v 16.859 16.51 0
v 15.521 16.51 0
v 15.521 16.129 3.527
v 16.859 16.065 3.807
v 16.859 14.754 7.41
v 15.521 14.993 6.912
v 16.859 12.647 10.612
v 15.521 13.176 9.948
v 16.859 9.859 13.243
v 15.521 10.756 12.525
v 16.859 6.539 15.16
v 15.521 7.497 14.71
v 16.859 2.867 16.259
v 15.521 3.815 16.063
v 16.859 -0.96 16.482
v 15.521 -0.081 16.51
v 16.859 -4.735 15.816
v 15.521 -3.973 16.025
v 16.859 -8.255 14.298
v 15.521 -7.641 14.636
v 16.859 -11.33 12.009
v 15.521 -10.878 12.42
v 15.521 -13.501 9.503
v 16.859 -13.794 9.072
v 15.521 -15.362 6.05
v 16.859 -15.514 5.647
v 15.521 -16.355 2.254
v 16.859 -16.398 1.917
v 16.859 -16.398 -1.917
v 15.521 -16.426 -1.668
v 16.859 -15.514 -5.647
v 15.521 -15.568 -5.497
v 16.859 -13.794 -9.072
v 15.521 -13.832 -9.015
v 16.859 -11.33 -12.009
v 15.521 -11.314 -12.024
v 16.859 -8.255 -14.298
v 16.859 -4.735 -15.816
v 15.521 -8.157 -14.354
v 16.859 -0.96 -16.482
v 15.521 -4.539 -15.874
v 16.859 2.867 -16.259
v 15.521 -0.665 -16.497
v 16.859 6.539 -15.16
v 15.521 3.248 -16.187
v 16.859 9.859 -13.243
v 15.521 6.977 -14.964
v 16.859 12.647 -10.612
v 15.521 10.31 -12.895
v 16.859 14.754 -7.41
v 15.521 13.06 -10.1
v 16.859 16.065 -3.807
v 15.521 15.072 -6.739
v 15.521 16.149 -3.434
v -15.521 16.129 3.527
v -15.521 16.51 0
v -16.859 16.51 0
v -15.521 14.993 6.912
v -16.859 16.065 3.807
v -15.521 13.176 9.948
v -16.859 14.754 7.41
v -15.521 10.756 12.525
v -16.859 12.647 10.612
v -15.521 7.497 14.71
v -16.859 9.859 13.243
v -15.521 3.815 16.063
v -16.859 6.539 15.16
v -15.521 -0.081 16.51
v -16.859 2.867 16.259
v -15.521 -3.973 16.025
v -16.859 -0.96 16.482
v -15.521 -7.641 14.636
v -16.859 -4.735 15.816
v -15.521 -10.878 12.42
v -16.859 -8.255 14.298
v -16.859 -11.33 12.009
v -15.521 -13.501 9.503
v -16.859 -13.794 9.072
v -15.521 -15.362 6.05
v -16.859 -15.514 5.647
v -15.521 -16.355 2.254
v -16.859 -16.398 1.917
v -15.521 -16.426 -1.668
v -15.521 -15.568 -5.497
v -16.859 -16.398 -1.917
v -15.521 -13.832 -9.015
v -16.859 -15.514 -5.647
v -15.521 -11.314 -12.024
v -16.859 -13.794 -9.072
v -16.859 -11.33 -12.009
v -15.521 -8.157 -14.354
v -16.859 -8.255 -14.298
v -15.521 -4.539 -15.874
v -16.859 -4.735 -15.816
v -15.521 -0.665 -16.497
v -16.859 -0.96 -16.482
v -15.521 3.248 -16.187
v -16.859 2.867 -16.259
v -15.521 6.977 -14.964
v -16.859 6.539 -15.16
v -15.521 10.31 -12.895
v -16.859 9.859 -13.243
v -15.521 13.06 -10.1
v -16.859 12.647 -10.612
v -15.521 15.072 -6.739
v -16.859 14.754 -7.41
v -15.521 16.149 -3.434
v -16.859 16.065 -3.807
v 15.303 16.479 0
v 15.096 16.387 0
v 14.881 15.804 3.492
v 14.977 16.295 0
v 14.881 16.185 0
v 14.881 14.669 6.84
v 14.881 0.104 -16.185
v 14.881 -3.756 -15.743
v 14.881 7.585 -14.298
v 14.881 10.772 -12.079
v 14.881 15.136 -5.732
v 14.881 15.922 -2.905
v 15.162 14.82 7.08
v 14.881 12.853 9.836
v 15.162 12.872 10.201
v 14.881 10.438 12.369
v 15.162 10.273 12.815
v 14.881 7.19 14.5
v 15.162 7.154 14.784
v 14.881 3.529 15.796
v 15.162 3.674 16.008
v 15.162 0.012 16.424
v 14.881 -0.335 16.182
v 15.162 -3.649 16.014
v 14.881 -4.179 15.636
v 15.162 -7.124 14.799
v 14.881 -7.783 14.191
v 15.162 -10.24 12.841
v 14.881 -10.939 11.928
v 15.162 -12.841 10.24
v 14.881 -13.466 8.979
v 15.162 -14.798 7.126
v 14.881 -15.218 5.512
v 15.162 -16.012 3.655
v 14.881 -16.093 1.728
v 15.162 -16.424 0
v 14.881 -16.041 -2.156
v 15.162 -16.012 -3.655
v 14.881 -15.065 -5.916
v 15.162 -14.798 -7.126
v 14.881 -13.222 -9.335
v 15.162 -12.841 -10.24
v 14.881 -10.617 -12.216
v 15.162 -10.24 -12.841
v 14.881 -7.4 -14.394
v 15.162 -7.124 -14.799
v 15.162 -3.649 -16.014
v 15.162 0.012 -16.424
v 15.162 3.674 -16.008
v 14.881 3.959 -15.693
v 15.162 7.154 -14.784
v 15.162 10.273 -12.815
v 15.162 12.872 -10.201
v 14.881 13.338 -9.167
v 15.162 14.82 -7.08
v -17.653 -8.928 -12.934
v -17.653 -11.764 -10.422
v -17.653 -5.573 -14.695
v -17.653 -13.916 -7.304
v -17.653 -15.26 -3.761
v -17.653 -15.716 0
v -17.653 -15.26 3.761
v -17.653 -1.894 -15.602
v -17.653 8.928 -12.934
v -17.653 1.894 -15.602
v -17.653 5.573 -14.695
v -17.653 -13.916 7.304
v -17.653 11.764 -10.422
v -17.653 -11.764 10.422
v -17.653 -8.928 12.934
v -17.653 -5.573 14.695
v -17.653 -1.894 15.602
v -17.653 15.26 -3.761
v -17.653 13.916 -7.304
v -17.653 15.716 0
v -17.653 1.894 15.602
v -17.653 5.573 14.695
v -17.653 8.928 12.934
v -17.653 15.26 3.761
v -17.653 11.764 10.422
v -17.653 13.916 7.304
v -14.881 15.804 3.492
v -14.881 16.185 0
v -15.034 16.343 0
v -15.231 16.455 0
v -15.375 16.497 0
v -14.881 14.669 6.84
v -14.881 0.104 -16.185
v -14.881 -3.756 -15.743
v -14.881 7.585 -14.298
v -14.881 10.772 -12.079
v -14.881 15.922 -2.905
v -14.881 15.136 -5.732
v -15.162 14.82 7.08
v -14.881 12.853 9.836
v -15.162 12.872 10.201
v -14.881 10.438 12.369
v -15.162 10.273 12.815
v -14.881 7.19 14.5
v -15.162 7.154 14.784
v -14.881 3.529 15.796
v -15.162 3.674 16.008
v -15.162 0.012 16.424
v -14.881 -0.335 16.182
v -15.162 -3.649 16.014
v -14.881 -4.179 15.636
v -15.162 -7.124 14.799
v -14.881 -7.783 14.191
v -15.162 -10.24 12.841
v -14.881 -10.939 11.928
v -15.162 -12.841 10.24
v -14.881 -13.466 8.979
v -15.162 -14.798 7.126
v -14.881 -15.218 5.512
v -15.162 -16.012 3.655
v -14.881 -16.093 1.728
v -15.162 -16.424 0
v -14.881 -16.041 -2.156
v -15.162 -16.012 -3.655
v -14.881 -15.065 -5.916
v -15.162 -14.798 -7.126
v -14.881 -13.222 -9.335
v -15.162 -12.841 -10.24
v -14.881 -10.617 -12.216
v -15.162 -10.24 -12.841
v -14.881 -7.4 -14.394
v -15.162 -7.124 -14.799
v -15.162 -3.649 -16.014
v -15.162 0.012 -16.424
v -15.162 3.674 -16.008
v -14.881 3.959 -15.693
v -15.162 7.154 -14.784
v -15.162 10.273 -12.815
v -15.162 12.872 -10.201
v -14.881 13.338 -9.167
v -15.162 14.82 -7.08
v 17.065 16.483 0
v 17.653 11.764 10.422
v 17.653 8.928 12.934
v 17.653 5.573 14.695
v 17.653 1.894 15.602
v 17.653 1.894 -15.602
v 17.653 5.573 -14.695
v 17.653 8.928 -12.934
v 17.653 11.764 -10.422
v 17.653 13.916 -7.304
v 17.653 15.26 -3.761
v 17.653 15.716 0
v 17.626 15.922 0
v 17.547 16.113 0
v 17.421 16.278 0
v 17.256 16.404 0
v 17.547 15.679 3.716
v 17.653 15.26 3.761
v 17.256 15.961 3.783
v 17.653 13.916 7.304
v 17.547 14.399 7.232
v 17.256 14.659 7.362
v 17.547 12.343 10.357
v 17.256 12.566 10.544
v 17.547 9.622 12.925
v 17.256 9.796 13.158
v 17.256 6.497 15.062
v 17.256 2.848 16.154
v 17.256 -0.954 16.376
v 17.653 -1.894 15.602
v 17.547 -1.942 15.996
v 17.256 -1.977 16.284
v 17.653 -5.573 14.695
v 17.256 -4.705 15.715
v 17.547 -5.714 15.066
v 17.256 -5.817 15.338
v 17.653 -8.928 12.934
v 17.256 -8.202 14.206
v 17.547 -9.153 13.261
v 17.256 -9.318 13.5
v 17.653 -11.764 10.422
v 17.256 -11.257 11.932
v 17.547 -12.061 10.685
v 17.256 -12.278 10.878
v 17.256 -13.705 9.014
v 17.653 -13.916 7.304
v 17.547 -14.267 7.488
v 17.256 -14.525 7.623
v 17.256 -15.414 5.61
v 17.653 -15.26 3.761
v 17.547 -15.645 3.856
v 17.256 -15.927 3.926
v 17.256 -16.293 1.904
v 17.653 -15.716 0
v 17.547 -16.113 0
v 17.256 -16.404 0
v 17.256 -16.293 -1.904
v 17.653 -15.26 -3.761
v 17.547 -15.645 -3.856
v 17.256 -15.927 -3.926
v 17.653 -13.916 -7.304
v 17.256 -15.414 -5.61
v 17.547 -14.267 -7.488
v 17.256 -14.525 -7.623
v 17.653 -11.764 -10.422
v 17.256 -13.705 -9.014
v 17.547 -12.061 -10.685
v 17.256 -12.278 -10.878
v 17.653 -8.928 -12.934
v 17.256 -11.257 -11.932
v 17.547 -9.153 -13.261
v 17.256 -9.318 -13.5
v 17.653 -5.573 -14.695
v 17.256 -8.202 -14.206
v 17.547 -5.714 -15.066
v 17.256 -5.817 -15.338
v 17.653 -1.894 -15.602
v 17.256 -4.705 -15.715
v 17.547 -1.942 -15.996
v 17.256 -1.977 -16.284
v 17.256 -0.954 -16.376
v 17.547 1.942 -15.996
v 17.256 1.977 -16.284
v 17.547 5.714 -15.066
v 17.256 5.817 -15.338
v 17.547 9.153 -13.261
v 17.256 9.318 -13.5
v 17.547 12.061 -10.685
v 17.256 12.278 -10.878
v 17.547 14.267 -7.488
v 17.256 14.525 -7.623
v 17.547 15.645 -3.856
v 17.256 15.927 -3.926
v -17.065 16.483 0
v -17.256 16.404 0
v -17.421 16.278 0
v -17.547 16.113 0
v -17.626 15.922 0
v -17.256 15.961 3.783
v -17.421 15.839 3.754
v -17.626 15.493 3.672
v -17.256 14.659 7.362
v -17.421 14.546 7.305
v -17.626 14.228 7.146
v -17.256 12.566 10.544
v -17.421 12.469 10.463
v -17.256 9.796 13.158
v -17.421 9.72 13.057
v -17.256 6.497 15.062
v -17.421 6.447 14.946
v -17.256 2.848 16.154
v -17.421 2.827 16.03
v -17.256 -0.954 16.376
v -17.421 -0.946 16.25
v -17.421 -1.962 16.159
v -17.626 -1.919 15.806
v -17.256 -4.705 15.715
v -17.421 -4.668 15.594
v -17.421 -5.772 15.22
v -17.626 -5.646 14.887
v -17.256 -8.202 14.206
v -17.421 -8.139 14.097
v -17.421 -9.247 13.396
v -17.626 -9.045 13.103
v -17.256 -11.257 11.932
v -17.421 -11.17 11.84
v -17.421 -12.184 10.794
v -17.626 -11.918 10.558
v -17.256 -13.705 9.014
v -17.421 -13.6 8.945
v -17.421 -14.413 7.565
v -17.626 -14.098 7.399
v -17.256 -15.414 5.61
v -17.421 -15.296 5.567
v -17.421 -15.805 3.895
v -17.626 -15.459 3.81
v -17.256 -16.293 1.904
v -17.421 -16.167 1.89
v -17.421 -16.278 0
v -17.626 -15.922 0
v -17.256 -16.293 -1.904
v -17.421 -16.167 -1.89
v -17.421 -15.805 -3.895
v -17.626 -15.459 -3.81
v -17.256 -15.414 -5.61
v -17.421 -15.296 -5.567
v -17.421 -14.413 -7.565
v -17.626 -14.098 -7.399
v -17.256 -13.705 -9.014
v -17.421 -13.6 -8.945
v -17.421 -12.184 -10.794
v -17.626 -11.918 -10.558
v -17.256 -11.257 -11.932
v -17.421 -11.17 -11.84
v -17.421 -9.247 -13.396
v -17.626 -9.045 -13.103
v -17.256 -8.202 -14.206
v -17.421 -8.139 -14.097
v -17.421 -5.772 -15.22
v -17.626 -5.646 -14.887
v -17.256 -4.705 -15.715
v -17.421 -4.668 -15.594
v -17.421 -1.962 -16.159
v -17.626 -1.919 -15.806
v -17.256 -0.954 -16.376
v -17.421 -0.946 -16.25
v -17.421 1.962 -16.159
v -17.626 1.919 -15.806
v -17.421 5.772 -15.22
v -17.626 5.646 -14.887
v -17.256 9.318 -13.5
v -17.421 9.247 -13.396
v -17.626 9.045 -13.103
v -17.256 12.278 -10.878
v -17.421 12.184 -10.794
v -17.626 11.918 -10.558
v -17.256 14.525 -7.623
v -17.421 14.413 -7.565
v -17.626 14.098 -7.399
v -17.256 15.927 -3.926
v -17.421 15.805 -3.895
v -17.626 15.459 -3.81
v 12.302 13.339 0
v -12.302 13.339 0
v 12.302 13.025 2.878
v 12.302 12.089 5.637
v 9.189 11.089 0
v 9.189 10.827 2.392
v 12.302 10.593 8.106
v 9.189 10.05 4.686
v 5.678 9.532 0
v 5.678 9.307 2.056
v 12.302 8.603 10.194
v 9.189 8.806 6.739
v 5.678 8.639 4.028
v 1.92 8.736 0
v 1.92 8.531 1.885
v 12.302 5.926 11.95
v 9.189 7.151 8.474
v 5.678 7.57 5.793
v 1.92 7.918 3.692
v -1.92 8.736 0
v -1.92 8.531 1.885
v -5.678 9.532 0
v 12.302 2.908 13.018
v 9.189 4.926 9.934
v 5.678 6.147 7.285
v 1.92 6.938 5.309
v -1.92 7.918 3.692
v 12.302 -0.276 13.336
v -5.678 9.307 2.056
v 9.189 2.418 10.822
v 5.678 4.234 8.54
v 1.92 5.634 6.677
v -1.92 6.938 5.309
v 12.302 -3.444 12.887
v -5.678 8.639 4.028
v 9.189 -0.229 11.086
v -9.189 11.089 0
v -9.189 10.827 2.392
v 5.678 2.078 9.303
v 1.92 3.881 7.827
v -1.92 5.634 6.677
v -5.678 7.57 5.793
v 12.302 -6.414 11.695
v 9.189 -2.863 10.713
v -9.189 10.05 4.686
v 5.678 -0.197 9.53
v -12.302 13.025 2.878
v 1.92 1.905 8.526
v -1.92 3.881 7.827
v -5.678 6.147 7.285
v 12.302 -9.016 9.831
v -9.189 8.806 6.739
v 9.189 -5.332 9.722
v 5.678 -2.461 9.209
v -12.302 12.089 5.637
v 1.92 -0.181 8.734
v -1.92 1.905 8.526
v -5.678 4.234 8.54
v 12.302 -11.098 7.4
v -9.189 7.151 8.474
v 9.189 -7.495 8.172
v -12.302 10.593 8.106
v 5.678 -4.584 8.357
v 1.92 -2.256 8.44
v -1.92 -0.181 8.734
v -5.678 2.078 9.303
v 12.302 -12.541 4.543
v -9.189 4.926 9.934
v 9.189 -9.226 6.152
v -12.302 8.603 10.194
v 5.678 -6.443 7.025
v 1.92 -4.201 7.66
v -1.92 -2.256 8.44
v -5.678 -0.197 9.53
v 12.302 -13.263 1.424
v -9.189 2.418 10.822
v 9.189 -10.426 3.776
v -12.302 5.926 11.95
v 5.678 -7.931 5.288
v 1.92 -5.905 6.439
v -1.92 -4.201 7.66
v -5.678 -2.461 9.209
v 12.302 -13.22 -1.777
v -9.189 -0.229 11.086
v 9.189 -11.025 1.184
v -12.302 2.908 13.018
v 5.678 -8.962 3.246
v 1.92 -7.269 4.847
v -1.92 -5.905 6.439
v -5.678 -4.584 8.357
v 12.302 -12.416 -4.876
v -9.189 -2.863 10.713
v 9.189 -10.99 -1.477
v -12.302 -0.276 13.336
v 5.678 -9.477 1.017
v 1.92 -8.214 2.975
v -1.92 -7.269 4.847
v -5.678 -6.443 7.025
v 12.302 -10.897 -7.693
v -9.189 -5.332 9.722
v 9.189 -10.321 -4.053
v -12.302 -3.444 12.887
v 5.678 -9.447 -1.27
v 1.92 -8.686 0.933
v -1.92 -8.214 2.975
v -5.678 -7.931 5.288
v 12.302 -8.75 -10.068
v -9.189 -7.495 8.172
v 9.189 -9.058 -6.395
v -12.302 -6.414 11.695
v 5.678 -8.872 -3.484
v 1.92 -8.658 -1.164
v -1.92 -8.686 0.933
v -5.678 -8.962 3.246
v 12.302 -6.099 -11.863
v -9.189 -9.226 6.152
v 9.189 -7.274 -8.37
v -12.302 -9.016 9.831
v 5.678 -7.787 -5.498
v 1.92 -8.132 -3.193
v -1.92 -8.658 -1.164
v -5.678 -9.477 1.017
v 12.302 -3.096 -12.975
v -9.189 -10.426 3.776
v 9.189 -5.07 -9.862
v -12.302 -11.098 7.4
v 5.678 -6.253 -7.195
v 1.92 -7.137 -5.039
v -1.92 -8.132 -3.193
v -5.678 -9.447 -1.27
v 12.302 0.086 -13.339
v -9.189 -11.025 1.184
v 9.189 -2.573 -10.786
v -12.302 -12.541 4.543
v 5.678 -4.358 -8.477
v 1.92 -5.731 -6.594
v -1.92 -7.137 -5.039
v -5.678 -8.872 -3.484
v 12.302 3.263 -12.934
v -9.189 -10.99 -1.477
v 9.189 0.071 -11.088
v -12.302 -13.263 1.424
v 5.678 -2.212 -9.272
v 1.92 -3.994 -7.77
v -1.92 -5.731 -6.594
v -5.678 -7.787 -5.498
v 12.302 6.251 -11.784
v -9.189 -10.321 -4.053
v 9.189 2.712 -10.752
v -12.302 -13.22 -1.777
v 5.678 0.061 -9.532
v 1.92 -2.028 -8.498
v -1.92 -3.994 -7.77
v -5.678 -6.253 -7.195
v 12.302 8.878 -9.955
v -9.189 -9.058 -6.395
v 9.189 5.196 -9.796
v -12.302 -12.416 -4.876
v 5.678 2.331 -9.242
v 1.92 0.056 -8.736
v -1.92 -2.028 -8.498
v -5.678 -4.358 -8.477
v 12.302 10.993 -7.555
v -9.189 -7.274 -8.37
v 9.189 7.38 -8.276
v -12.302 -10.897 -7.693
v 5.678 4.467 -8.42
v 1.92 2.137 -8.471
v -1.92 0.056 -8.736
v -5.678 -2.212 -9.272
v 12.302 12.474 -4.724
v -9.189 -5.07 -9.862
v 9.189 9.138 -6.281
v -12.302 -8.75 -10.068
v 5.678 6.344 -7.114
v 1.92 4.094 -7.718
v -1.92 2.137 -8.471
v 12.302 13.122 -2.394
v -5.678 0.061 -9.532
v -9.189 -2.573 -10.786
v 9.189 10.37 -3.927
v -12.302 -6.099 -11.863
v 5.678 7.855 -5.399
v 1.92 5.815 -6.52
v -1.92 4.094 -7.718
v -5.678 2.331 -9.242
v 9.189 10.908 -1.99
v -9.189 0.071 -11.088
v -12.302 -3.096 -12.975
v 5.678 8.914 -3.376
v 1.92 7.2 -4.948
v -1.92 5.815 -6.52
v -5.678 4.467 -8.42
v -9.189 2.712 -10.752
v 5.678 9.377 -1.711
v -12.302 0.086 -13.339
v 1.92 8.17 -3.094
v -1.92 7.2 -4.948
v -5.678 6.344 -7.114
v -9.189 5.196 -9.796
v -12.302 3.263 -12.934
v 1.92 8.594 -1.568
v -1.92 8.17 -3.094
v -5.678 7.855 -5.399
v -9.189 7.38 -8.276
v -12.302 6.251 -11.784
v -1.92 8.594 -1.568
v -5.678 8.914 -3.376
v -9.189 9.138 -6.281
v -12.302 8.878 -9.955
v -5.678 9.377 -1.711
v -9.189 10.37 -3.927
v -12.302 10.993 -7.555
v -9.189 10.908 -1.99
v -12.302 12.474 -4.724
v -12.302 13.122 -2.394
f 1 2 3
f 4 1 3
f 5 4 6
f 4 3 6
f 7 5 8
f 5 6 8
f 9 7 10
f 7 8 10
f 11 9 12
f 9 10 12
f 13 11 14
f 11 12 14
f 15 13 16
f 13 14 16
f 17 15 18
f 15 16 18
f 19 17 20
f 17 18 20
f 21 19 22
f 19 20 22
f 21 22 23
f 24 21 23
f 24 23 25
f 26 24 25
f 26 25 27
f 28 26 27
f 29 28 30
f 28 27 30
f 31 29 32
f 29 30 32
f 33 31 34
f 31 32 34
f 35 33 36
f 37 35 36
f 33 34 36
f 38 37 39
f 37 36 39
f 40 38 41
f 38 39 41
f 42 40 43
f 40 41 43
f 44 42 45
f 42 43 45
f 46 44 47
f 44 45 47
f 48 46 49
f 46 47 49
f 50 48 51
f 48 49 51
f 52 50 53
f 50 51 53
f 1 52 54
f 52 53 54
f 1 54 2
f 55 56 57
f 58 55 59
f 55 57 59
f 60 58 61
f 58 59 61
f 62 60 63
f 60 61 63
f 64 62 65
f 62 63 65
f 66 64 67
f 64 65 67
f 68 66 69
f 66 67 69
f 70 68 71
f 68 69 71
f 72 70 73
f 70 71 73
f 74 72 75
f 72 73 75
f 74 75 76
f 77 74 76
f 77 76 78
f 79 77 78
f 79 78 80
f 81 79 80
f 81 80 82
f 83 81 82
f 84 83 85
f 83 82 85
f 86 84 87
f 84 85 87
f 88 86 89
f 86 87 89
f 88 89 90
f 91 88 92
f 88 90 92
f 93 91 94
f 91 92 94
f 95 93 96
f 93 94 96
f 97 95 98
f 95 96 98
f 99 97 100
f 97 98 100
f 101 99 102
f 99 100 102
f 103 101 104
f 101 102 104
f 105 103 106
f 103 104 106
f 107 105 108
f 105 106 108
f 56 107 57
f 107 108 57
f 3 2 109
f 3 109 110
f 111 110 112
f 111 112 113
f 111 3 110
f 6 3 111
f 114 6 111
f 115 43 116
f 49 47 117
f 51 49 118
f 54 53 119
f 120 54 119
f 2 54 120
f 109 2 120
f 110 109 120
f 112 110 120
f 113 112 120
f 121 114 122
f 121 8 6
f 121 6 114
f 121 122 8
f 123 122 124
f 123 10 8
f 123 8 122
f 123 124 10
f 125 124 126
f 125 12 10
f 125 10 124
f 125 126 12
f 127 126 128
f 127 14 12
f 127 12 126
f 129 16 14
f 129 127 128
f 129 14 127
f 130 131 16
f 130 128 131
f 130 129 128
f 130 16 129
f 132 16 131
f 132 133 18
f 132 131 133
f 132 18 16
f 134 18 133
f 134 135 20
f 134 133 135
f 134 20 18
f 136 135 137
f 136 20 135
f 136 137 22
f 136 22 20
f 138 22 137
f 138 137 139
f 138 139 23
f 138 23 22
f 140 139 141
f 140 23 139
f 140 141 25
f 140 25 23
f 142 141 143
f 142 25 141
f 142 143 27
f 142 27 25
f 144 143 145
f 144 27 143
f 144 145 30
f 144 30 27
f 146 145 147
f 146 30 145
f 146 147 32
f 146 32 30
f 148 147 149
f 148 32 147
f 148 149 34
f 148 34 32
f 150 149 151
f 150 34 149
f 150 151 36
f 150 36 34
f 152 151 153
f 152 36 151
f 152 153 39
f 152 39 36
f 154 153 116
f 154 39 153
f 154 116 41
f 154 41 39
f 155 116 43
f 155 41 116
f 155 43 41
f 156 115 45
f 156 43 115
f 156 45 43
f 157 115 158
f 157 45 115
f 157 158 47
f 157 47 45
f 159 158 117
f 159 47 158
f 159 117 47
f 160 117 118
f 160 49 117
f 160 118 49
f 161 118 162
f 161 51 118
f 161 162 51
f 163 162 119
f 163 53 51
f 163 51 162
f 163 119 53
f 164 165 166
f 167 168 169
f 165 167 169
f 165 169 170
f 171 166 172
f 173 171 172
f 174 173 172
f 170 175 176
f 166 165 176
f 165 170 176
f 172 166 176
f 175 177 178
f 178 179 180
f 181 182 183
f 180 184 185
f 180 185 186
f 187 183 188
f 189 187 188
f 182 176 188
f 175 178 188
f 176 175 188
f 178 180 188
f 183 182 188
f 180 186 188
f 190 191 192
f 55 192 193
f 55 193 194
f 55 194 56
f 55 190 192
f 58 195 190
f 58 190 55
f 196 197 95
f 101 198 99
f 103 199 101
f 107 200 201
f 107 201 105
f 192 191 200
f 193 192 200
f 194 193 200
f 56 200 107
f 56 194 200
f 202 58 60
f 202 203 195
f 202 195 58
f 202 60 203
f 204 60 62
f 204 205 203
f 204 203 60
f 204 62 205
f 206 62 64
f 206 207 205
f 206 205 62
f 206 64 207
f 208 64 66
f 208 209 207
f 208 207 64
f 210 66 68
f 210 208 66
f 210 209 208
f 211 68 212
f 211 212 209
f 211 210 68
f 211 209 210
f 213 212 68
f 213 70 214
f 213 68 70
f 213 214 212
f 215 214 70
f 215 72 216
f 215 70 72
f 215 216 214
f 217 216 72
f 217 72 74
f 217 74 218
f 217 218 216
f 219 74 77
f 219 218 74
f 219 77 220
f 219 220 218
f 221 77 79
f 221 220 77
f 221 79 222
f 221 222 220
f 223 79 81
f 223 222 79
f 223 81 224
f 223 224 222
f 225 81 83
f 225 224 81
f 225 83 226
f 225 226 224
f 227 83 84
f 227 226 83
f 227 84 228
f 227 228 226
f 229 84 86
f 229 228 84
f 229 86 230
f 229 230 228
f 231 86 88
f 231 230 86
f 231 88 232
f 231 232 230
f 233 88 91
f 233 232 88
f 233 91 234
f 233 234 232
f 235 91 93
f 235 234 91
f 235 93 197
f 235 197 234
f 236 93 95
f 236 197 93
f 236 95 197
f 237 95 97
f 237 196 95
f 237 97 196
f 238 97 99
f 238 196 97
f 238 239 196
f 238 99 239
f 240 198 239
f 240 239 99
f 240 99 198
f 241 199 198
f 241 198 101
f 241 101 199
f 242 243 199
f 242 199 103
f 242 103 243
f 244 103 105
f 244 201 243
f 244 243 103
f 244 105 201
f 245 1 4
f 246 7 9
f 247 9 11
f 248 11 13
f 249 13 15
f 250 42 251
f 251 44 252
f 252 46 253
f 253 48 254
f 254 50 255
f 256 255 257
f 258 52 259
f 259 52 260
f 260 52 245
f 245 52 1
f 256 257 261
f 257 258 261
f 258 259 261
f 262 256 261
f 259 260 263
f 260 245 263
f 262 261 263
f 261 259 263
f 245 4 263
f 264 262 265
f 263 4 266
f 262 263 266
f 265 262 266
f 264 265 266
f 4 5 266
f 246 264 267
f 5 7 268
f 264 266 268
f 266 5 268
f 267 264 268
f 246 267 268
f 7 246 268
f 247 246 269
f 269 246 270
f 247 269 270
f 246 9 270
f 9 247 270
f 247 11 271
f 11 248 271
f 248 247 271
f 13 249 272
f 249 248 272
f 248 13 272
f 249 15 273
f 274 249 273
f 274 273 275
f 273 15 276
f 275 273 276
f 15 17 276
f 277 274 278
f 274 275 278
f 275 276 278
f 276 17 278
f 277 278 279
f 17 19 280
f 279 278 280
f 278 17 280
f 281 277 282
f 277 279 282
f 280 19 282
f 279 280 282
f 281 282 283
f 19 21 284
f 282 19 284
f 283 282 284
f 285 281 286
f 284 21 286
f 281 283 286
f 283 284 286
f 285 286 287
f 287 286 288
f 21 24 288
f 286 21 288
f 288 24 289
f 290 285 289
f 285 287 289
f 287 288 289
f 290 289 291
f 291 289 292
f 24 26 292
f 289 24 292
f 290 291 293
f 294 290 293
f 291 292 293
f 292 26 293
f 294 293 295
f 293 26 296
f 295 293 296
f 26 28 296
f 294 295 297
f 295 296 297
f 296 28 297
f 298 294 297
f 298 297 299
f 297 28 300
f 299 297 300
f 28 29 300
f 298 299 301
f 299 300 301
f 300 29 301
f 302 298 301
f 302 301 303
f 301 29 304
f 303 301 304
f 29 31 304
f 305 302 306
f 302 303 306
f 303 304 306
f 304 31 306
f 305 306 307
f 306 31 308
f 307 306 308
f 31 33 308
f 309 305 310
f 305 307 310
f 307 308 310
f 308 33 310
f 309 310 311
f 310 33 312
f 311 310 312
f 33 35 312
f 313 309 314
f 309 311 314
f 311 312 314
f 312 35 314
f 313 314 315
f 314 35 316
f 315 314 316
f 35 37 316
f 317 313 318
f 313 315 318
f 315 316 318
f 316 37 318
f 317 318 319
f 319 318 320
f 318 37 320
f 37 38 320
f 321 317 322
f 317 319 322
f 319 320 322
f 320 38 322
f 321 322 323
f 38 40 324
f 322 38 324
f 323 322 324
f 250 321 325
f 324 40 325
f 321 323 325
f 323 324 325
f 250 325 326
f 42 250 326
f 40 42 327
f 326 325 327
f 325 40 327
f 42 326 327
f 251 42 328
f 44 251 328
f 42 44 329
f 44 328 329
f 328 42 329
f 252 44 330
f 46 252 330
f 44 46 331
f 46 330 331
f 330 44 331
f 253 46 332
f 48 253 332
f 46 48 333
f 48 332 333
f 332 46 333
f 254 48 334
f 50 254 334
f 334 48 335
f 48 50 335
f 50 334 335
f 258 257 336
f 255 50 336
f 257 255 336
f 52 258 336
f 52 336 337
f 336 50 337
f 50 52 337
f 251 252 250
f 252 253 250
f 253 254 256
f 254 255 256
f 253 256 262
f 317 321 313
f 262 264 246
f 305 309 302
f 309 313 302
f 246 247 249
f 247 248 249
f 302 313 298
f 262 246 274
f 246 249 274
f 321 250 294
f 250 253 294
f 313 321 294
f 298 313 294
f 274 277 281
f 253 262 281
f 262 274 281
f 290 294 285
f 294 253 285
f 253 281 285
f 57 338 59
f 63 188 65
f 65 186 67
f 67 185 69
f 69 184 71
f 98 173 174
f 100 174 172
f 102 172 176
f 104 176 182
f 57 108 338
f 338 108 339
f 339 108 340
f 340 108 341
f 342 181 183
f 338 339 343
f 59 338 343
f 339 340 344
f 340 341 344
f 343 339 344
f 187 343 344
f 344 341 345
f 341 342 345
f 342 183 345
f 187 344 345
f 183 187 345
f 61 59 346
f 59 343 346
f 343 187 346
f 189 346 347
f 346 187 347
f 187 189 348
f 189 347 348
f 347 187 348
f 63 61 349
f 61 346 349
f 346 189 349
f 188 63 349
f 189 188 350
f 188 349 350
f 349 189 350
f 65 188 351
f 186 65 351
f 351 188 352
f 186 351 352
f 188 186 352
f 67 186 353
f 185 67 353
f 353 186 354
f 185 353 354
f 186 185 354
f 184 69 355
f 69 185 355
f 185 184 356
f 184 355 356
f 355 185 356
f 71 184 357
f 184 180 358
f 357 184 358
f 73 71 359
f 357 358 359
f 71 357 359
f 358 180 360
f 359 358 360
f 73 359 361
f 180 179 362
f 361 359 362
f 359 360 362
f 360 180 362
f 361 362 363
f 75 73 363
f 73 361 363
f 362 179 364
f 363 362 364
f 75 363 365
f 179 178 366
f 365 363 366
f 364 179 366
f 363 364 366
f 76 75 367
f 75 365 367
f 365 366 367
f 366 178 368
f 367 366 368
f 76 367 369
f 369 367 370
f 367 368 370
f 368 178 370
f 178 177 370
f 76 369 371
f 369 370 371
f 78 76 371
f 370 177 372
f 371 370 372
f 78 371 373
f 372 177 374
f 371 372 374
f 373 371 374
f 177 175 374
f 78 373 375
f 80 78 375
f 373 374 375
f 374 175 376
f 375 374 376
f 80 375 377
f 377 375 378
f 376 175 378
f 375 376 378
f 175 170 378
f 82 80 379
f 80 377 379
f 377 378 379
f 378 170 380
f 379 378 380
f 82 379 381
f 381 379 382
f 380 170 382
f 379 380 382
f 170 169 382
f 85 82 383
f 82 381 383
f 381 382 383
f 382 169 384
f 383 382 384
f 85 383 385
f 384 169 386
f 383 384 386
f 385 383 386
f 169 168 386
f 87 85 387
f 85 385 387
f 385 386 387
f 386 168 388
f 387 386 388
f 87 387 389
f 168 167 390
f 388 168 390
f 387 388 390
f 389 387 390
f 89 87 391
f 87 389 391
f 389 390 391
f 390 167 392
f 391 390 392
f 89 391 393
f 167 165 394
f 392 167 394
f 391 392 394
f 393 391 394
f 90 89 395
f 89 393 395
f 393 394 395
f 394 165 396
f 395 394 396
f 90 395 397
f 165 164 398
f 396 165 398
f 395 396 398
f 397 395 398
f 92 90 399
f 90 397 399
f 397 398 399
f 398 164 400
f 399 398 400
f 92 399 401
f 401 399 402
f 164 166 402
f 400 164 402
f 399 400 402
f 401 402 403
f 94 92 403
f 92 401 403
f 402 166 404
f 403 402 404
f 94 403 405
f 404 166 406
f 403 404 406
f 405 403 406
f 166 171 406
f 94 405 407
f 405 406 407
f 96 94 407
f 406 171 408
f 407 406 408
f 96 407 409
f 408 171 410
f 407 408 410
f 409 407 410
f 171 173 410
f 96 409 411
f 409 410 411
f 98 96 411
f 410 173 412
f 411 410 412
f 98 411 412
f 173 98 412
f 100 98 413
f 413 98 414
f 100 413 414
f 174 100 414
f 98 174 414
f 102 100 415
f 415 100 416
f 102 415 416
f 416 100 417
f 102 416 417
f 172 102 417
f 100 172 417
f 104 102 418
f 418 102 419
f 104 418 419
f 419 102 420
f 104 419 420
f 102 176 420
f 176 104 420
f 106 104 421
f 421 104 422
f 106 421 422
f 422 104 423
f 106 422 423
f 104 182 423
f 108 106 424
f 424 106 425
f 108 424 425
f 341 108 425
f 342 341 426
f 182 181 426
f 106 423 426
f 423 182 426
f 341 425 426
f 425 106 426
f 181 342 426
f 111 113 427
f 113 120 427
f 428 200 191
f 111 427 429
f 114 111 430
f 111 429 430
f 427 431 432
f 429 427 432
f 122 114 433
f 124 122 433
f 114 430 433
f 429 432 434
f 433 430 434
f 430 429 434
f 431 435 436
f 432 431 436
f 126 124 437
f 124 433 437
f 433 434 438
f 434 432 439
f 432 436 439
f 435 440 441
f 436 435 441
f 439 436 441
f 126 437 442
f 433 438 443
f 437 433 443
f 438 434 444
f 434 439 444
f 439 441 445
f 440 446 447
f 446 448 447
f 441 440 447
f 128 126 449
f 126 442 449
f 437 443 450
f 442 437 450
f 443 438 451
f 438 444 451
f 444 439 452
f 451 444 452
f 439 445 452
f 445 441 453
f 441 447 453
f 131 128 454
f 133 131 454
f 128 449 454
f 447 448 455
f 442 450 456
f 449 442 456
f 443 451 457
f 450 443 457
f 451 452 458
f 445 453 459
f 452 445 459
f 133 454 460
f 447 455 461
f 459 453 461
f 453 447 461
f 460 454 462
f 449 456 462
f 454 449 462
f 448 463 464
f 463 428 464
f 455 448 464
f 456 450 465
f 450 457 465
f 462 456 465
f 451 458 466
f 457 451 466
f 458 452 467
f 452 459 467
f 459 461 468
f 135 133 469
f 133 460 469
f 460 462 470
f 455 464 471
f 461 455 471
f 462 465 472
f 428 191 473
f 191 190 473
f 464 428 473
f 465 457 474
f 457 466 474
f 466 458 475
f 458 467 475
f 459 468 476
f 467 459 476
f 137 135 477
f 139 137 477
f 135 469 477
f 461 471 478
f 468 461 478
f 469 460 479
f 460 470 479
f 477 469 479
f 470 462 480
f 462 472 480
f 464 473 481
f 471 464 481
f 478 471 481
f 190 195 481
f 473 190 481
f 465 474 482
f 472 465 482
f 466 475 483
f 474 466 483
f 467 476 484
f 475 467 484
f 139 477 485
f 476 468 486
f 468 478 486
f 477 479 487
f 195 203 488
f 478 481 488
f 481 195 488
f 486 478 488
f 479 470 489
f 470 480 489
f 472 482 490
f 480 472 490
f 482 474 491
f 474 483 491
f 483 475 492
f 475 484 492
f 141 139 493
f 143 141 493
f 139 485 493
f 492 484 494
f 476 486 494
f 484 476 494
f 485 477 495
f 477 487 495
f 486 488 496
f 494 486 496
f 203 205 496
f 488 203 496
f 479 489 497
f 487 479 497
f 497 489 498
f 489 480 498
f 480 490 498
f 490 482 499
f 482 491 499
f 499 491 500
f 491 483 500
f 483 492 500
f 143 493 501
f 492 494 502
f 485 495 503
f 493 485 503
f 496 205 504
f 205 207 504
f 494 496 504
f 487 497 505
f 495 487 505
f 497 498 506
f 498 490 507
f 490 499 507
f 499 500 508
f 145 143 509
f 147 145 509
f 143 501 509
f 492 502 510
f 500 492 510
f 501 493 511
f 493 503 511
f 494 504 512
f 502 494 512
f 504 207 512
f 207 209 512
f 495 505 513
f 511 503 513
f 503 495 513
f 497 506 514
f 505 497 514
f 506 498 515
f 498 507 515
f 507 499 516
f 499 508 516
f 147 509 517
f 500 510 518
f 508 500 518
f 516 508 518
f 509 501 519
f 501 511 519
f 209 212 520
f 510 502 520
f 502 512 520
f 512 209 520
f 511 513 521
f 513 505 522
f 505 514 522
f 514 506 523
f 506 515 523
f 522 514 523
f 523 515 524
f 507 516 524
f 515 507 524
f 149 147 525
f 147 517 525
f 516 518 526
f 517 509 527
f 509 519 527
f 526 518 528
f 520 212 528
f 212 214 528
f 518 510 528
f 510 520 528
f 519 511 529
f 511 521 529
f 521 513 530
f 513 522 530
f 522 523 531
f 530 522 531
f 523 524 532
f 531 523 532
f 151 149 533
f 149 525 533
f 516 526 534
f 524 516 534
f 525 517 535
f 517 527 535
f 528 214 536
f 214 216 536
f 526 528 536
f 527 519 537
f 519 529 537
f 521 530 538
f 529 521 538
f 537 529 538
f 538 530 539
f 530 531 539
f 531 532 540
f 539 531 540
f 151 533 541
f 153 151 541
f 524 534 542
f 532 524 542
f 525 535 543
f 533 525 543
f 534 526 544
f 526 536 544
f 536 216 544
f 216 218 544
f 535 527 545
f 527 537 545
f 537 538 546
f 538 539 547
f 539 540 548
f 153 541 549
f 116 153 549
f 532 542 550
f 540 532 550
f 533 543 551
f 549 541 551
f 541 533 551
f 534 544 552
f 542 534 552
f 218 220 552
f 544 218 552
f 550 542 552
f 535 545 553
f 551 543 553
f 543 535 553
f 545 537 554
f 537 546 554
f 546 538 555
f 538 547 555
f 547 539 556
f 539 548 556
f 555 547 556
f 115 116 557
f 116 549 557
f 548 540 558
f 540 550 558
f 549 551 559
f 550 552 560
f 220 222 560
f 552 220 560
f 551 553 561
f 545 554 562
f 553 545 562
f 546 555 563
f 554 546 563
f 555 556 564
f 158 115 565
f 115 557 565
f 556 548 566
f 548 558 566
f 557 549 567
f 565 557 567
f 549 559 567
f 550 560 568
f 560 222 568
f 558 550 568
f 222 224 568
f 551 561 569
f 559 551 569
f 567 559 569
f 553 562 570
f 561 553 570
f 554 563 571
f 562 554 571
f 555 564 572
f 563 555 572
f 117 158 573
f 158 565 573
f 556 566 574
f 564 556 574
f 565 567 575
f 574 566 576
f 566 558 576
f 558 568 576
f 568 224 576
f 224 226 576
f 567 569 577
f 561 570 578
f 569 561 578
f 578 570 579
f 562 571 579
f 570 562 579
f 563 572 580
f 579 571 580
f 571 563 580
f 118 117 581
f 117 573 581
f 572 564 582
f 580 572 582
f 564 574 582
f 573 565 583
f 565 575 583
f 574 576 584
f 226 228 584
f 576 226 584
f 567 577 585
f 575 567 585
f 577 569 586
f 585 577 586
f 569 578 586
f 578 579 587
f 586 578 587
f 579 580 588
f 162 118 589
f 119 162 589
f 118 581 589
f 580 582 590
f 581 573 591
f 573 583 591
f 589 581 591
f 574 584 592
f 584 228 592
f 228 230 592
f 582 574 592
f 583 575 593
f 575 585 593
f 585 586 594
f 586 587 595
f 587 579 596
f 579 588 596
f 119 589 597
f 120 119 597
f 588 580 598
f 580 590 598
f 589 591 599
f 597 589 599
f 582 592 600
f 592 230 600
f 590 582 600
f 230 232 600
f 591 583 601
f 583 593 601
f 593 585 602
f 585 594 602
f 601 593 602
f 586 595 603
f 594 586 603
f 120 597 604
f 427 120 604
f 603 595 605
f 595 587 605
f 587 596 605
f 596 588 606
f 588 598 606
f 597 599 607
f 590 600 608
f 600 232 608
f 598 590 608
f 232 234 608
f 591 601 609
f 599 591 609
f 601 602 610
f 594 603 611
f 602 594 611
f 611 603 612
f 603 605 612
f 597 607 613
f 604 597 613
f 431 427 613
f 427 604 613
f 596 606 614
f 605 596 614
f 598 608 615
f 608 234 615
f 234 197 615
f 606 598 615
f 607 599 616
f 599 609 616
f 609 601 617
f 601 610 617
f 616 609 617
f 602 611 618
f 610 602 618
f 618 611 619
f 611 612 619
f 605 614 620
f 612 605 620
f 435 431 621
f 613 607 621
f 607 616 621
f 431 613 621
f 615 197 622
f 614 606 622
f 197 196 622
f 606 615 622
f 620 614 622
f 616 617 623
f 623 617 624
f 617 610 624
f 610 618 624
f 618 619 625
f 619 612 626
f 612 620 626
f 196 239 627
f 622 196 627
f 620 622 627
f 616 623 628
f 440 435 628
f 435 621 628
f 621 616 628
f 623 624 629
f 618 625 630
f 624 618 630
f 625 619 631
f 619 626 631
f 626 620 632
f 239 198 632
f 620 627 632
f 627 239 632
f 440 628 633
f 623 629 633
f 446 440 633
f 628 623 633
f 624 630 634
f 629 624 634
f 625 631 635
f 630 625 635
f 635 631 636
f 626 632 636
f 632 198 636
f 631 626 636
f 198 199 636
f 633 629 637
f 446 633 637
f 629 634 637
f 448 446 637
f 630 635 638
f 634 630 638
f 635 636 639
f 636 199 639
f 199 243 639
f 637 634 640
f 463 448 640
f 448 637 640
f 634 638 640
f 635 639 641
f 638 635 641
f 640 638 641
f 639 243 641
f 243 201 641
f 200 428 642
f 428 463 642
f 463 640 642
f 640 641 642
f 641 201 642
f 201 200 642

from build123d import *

# Parameters (mm, degrees)
FILLET2_R = 0.79375


with BuildPart() as part:
    # Sketch1 → Revolve1 (revolve)
    with BuildSketch(Plane.XY):
        with BuildLine():
            Line((-17.653, 0), (17.653, 0))
            Line((17.653, 0), (17.653, 16.51))
            Line((17.653, 16.51), (15.113, 16.51))
            ThreePointArc((15.113, 16.51), (0, 8.636), (-15.113, 16.51))
            Line((-15.113, 16.51), (-17.653, 16.51))
            Line((-17.653, 16.51), (-17.653, 0))
        make_face()
    revolve(axis=Axis((-17.653, 0, 0), (1, 0, 0)))

    # Fillet2
    fillet2_edges = [part.edges().sort_by_distance(p)[0] for p in [
        (-17.653, -16.51, 0),
        (-15.113, -16.51, 0),
        (15.113, -16.51, 0),
        (17.653, -16.51, 0),
    ]]
    fillet(fillet2_edges, radius=FILLET2_R)


solid = part.part
